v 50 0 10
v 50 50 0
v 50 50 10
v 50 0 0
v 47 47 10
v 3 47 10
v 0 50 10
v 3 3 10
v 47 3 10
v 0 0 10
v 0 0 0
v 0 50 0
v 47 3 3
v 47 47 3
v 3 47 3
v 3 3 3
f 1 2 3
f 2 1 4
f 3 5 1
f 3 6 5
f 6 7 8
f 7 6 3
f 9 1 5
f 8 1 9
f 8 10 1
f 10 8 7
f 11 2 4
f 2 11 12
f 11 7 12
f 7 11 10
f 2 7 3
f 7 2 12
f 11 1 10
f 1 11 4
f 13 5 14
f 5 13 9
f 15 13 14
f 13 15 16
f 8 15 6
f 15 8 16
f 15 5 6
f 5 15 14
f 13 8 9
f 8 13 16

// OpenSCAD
// Generated by HEIDI for job job_1787769937629_144b4ec9
// Product: 3D-Printable Model Preparation Package
// Request: Failure injection test
// Model type: box
// Generated: 2026-09-07T04:35:15.351Z
//
// This is a parameterized OpenSCAD model. You can adjust the
// parameters below to customize the dimensions before rendering.

// ─── Parameters ───
width = 50;       // X dimension in mm
height = 50;     // Y dimension in mm
depth = 10;       // Z dimension in mm
wall = 3;    // wall thickness in mm
$fn = 60;               // facet resolution

// Parametric hollow box
module parametric_box() {
    difference() {
        // Outer shell
        cube([width, height, depth]);
        // Inner cavity
        translate([wall, wall, wall])
            cube([width - wall * 2, height - wall * 2, depth - wall + 1]);
    }
}
parametric_box();
